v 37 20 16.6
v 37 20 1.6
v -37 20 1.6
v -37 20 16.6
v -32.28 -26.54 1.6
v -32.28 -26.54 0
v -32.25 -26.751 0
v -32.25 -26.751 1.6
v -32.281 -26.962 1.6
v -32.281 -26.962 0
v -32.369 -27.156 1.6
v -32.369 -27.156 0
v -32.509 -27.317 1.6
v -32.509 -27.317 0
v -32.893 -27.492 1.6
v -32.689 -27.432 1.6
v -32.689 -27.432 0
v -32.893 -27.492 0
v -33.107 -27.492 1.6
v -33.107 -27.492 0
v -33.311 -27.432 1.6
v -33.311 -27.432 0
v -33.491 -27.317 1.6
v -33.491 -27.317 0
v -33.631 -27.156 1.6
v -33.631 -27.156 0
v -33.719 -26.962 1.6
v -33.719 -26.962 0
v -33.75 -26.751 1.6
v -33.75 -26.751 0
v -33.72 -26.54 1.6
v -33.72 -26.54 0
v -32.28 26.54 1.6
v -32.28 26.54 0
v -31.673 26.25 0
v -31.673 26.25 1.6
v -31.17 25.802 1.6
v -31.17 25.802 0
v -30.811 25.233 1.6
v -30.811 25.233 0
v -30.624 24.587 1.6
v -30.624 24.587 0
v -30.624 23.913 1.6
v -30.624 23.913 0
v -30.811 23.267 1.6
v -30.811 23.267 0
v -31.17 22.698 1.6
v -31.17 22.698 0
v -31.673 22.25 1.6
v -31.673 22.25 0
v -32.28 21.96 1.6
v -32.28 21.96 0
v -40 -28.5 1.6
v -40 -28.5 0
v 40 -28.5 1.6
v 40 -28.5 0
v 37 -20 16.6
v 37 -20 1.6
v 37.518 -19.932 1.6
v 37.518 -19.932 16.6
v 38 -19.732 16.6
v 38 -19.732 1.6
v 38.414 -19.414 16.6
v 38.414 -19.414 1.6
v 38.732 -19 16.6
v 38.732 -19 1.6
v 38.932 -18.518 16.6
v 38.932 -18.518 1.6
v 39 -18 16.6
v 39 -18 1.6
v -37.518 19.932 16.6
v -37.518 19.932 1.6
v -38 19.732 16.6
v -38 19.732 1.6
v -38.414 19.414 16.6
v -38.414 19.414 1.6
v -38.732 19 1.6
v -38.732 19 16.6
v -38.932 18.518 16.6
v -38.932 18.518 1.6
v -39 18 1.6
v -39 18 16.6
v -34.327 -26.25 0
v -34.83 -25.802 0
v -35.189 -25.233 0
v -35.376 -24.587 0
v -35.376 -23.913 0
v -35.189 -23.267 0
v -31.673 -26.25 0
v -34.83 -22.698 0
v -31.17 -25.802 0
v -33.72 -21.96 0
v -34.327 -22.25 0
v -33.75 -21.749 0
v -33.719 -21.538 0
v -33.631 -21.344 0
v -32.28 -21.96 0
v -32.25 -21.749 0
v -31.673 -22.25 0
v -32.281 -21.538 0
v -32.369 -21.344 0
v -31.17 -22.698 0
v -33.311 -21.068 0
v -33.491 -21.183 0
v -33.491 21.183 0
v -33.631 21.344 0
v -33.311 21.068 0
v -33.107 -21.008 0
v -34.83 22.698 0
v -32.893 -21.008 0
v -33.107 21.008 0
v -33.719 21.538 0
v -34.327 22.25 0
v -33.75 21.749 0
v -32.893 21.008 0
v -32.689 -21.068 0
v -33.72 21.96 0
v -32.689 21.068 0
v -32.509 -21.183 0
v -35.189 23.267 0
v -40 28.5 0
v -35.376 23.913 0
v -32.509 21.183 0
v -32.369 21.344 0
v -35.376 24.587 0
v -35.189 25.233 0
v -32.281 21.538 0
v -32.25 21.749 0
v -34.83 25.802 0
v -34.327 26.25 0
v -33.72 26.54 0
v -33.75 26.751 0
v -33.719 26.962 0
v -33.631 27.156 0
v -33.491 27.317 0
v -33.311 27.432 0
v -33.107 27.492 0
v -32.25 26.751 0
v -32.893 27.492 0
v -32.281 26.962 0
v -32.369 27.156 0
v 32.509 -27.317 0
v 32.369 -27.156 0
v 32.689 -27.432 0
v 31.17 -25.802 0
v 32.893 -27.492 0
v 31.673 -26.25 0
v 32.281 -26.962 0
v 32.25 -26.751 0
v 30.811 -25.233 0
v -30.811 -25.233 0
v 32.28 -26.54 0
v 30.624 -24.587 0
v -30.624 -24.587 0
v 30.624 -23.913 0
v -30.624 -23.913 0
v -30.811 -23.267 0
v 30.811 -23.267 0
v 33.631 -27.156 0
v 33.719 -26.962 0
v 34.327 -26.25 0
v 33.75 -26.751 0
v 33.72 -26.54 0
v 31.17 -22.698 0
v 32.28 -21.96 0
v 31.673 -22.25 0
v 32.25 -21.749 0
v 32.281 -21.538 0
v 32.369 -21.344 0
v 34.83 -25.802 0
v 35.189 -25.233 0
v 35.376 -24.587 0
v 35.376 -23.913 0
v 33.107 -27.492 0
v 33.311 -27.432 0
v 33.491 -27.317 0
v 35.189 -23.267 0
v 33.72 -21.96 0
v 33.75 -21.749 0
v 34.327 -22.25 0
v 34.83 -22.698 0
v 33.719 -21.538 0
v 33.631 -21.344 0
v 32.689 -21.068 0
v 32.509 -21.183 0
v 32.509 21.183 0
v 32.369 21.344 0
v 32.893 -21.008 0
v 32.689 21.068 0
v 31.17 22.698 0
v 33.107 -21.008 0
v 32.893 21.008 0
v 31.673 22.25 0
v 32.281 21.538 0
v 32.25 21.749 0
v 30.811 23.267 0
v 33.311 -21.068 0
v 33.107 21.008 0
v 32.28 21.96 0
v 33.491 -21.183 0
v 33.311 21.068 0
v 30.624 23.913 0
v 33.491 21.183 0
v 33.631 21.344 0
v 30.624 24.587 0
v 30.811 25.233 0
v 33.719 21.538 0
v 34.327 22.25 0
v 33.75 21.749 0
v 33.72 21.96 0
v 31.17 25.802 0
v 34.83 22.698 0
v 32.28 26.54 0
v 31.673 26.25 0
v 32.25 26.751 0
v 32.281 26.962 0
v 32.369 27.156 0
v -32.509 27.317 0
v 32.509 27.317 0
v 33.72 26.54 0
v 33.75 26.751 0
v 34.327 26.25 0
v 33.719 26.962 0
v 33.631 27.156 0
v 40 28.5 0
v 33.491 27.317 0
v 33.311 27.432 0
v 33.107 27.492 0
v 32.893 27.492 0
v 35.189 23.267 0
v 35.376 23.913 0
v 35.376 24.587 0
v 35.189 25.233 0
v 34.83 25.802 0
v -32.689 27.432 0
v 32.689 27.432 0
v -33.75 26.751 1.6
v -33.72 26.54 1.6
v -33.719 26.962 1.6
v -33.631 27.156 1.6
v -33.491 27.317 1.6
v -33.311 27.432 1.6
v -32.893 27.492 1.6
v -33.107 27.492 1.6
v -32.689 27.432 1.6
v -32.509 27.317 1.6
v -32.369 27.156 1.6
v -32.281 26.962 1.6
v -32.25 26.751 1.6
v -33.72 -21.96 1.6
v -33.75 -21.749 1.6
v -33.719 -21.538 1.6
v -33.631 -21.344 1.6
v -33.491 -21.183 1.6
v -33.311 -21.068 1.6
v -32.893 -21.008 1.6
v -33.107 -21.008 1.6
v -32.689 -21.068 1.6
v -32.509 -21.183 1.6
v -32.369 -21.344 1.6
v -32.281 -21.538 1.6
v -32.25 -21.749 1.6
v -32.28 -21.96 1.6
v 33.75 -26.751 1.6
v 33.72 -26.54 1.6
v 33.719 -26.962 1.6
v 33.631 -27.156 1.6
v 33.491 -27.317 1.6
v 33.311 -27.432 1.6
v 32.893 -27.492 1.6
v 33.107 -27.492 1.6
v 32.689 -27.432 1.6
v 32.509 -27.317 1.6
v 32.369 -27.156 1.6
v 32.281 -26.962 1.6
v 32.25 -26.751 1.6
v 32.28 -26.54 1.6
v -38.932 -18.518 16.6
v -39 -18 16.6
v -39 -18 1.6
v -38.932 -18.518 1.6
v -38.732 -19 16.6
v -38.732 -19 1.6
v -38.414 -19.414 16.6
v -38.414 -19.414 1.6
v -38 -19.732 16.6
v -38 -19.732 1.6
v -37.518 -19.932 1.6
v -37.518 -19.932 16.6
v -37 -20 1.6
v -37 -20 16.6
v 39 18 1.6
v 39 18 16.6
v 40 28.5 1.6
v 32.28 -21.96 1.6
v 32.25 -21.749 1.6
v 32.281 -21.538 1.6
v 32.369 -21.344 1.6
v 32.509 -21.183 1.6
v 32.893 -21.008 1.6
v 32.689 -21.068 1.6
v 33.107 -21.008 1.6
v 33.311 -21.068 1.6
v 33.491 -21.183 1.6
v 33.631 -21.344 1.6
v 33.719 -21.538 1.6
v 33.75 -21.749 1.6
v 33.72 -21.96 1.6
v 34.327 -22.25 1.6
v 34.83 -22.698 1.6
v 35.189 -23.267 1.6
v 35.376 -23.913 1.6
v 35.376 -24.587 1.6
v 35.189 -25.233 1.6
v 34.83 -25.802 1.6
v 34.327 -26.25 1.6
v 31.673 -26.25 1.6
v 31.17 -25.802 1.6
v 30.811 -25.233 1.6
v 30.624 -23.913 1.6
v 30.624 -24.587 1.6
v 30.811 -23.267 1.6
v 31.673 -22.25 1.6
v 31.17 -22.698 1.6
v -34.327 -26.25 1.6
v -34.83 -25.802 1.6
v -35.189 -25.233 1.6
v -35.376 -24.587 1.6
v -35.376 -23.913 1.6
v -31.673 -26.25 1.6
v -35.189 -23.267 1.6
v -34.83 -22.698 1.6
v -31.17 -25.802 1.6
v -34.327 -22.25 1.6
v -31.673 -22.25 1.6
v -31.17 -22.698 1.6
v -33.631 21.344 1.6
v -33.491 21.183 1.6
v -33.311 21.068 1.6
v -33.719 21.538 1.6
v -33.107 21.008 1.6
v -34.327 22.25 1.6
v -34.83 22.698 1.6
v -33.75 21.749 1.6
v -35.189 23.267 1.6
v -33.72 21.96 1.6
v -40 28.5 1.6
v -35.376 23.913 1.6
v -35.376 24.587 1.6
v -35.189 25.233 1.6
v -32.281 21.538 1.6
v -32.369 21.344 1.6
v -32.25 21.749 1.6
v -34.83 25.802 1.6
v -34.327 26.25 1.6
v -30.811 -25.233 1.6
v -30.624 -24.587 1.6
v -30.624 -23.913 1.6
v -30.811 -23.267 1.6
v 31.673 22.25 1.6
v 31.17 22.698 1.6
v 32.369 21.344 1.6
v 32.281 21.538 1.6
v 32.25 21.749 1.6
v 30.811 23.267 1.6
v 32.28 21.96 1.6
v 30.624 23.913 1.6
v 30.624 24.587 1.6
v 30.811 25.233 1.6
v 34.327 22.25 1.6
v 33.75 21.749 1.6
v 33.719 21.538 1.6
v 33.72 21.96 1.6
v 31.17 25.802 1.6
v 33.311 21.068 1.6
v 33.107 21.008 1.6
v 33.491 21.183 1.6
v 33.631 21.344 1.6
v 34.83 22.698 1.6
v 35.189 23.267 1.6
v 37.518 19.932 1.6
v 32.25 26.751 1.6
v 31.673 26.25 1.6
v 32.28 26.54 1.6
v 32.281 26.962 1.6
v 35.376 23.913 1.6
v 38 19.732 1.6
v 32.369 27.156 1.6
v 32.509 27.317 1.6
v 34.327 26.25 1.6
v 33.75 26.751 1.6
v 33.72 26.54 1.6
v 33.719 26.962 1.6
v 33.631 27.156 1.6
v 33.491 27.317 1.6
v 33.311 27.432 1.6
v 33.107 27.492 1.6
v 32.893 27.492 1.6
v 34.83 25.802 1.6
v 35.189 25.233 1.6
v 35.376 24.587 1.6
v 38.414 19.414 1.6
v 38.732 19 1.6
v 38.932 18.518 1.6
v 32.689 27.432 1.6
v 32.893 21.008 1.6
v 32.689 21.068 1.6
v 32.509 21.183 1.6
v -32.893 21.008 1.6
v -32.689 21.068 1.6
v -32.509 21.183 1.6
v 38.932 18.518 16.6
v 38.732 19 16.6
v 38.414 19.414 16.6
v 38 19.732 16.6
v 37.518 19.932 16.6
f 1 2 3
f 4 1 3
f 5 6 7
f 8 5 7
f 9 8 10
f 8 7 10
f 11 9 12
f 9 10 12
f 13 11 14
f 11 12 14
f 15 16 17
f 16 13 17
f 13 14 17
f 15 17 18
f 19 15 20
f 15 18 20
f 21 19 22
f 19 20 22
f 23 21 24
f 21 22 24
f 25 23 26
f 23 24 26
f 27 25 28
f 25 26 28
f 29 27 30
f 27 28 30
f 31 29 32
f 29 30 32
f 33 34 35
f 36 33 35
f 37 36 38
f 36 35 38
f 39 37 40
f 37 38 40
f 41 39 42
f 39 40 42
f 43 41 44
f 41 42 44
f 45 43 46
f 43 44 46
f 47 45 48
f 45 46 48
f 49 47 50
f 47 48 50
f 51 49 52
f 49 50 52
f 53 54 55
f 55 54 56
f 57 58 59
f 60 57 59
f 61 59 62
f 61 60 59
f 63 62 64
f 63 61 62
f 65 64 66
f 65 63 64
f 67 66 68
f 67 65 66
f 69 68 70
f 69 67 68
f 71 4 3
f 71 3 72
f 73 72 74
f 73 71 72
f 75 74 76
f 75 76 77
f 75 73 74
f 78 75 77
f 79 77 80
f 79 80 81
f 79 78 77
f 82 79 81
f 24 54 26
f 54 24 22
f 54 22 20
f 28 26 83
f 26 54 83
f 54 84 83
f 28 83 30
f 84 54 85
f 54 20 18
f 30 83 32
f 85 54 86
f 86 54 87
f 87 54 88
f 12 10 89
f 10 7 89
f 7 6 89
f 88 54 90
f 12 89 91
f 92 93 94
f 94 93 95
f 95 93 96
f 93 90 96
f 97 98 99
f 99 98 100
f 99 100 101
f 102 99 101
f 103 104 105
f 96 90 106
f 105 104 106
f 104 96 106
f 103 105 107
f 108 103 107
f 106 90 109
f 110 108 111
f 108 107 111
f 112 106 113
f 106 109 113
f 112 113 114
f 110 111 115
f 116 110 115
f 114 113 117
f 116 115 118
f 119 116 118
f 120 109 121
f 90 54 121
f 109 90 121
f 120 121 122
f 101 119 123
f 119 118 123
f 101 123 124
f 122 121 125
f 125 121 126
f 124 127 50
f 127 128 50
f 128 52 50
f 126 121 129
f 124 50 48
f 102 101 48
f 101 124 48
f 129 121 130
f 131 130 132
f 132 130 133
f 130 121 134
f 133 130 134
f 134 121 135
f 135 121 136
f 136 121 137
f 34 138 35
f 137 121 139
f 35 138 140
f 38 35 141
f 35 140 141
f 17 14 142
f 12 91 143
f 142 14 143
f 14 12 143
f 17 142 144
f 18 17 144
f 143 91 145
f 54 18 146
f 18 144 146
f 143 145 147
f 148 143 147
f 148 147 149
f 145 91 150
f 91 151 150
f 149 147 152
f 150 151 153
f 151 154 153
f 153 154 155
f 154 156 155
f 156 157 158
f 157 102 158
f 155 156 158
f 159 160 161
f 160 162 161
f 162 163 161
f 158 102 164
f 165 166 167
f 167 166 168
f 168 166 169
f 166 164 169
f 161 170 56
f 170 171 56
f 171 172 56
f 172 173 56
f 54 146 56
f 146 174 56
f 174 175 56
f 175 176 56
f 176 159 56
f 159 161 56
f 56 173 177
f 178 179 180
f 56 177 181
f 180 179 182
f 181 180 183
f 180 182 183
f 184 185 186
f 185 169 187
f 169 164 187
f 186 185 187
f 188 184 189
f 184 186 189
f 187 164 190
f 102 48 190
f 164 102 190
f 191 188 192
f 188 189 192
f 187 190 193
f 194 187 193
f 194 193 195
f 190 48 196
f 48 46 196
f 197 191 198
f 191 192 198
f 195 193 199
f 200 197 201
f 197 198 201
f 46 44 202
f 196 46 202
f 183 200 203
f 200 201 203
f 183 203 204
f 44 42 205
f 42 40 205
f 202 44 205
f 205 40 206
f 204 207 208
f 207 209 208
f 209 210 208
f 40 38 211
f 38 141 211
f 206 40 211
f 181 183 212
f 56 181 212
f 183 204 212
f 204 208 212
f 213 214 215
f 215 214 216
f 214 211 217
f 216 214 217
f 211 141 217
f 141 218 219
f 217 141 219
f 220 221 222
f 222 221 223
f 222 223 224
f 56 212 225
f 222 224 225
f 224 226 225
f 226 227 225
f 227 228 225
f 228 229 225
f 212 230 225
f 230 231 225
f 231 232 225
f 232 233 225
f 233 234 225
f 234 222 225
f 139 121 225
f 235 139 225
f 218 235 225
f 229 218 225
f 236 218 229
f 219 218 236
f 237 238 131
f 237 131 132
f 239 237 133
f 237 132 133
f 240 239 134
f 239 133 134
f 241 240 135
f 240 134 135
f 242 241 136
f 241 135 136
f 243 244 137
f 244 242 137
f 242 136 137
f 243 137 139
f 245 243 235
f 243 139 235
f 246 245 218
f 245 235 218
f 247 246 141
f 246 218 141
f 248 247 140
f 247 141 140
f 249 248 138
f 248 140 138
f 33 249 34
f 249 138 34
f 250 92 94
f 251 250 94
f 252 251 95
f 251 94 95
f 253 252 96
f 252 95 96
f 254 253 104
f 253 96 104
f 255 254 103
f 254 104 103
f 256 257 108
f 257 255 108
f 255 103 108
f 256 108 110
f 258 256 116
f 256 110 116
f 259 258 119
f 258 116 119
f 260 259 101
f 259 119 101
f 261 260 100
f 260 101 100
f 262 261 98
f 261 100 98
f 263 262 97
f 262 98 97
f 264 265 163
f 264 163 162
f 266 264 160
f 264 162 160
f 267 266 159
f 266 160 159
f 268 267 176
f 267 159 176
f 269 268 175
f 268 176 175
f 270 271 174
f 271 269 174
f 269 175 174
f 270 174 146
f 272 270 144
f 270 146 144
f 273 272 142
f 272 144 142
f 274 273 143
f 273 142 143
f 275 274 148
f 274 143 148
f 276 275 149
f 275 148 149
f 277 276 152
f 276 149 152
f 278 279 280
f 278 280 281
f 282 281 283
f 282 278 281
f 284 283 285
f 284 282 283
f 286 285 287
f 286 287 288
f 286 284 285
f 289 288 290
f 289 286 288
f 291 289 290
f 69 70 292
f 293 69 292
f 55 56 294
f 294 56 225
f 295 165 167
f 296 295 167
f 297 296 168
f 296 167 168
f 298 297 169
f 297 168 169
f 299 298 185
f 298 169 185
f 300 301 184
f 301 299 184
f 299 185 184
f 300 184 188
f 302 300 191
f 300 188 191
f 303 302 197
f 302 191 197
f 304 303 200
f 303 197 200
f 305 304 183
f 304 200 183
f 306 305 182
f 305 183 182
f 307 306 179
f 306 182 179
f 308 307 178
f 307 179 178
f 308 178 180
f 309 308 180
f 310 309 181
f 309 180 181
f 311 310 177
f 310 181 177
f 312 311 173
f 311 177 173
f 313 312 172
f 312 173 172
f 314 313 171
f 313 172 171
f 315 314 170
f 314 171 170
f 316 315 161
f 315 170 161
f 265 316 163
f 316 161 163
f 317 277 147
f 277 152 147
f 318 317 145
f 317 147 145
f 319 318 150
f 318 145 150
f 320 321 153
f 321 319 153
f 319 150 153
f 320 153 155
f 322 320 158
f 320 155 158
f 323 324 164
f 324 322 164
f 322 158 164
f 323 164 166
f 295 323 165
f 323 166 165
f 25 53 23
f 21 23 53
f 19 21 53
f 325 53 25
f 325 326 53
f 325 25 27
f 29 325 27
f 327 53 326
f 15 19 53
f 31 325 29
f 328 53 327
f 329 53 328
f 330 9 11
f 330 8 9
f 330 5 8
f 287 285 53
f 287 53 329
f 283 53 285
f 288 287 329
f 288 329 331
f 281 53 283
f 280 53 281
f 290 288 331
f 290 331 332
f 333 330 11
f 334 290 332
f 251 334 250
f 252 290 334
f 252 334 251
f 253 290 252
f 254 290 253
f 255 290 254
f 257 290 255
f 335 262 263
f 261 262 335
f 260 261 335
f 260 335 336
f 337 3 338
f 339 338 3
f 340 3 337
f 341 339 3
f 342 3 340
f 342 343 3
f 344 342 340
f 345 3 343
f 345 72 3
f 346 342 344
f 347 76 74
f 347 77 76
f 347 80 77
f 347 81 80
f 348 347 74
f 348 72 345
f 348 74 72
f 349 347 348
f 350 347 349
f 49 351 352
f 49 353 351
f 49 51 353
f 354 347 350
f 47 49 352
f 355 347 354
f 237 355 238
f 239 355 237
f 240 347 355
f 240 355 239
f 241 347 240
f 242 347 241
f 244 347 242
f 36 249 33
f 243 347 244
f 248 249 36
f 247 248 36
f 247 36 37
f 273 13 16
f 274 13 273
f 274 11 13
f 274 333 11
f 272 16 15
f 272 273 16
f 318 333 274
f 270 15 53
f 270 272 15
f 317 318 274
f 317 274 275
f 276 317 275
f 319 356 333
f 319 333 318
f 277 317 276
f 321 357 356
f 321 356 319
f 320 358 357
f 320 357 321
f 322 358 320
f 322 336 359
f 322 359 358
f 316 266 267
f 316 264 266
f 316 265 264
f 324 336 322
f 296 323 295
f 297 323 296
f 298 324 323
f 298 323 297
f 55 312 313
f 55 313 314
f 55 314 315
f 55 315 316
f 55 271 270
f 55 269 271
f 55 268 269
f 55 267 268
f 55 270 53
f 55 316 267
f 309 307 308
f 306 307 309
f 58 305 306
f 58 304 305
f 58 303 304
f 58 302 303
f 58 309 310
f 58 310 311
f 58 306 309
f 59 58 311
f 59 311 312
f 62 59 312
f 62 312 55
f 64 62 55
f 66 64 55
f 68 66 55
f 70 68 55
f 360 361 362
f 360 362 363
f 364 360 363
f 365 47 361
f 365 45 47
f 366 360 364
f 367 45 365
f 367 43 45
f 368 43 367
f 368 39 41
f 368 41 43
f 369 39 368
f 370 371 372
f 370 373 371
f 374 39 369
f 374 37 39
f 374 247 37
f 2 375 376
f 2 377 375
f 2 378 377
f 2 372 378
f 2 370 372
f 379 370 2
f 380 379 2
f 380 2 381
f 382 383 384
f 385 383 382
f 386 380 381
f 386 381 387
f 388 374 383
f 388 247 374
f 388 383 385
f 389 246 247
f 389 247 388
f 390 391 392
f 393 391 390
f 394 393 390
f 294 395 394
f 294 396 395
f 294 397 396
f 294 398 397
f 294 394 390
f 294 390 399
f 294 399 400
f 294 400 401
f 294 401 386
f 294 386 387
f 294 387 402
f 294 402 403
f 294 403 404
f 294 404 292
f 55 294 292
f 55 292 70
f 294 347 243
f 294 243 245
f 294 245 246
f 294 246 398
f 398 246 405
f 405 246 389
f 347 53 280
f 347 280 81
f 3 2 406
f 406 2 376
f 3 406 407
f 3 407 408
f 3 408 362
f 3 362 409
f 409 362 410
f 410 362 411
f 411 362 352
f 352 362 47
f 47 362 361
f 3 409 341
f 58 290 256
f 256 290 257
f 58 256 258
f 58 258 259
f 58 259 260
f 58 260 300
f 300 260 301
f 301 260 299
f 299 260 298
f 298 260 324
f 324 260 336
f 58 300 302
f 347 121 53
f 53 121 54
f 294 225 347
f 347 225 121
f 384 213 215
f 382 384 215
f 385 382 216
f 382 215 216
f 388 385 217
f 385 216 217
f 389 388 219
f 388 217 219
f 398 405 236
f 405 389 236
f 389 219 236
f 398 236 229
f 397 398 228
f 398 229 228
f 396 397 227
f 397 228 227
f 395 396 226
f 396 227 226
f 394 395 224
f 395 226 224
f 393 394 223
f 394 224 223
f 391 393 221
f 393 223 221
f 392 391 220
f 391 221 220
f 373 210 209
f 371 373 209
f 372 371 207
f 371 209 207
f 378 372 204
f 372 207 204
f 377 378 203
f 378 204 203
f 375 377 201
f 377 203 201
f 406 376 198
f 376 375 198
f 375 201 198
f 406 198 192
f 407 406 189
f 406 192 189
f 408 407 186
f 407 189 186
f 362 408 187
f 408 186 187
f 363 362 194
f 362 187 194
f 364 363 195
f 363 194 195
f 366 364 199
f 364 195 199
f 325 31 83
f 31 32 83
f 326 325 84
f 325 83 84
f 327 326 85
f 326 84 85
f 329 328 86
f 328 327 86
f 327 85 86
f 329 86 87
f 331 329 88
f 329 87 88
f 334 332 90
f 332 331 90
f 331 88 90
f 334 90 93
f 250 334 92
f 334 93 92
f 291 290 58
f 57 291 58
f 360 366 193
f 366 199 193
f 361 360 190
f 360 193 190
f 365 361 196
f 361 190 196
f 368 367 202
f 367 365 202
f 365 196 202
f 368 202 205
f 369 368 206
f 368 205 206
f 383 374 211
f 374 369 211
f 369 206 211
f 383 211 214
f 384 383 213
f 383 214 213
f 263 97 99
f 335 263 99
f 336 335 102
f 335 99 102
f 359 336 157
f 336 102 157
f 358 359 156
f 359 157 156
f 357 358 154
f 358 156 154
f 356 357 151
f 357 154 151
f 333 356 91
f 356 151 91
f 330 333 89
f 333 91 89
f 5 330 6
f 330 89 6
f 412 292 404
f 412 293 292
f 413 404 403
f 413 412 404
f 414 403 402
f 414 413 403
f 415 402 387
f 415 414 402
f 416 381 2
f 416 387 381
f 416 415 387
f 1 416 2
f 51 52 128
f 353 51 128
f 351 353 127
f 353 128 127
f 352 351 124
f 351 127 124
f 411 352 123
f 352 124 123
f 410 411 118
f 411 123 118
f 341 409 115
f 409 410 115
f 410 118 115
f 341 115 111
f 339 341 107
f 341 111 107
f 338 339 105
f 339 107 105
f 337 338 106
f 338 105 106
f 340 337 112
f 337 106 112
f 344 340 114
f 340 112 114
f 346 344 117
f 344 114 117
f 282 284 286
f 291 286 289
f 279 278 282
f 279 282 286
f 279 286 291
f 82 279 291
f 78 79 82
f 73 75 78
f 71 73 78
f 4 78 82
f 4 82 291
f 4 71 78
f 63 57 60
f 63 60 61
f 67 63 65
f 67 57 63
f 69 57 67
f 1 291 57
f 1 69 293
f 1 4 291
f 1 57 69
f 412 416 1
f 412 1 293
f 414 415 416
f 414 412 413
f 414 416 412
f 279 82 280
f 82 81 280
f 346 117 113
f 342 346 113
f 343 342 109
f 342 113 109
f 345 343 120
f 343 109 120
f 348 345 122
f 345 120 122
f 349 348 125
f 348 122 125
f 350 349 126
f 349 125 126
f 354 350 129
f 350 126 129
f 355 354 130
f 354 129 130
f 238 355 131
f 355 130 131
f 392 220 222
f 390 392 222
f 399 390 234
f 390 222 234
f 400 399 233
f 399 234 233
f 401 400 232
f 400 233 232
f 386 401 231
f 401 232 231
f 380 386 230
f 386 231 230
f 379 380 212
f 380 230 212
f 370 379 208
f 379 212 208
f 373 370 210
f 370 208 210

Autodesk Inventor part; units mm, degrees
ref_plane "YZ Plane" through (0, 0, 0) normal (1, 0, 0) x (0, 1, 0)
ref_plane "XZ Plane" through (0, 0, 0) normal (0, 1, 0) x (-1, 0, 0)
ref_plane "XY Plane" through (0, 0, 0) normal (0, 0, 1) x (1, 0, 0)
sketch "Sketch1" plane through (0, 0, 0) normal (0, 0, 1) x (1, 0, 0)
  line L0 (40, 28.5) -> (-40, 28.5)
  line L1 (-40, 28.5) -> (-40, -28.5)
  line L2 (-40, -28.5) -> (40, -28.5)
  line L3 (40, -28.5) -> (40, 28.5)
  line L4 (40, 28.5) -> (-40, -28.5) construction
  line L5 (-40, 28.5) -> (40, -28.5) construction
  line L6 (-33, 24.25) -> (33, 24.25) construction
  line L7 (33, 24.25) -> (33, -24.25) construction
  line L8 (33, -24.25) -> (-33, -24.25) construction
  line L9 (-33, -24.25) -> (-33, 24.25) construction
  line L10 (-33, 24.25) -> (33, -24.25) construction
  line L11 (33, 24.25) -> (-33, -24.25) construction
  line L12 (40, 0) -> (-40, 0) construction
  line L13 (0, 28.5) -> (0, -28.5) construction
  circle A0 centre (33, 24.25) radius 2.4
  circle A1 centre (-33, 24.25) radius 2.4
  circle A2 centre (33, -24.25) radius 2.4
  circle A3 centre (-33, -24.25) radius 2.4
  line L14 (33, 27.5) -> (33, 21) construction
  arc A4 (32.2801, 21.9605) -> (33.7199, 21.9605) centre (33, 21.75) ccw
  arc A5 (-33.7199, 21.9605) -> (-32.2801, 21.9605) centre (-33, 21.75) ccw
  arc A6 (33.7199, -21.9605) -> (32.2801, -21.9605) centre (33, -21.75) ccw
  arc A7 (-32.2801, -21.9605) -> (-33.7199, -21.9605) centre (-33, -21.75) ccw
  line L15 (39, 20) -> (-39, 20)
  line L16 (-39, 20) -> (-39, -20)
  line L17 (-39, -20) -> (39, -20)
  line L18 (39, -20) -> (39, 20)
  line L19 (39, 20) -> (-39, -20) construction
  line L20 (-39, 20) -> (39, -20) construction
  arc A8 (33.7199, 26.5395) -> (32.2801, 26.5395) centre (33, 26.75) ccw
  arc A9 (-32.2801, 26.5395) -> (-33.7199, 26.5395) centre (-33, 26.75) ccw
  arc A10 (32.2801, -26.5395) -> (33.7199, -26.5395) centre (33, -26.75) ccw
  arc A11 (-33.7199, -26.5395) -> (-32.2801, -26.5395) centre (-33, -26.75) ccw
  point P0 (0, 0)
  point P1 (33, -21)
  point P2 (-32.2801, 21.9605)
  point P3 (-33.7199, 21.9605)
  point P4 (-33.7199, -21.9605)
  point P5 (-32.2801, -21.9605)
  point P6 (32.2801, -21.9605)
  point P7 (33.7199, -21.9605)
  point P8 (32.2801, 26.5395)
  point P9 (33.7199, 26.5395)
  point P10 (-33.7199, 26.5395)
  point P11 (-32.2801, 26.5395)
  point P12 (-32.2801, -26.5395)
  point P13 (-33.7199, -26.5395)
  point P14 (33.7199, -26.5395)
  point P15 (32.2801, -26.5395)
  dimension "d0" = 80
  dimension "d1" = 57
  dimension "d19" = 4.8
  dimension "d30" = 6.5
  dimension "d33" = 48.5
  dimension "d34" = 66
  dimension "d36" = 1.5
  dimension "d37" = 8.5
  dimension "d38" = 1
  dimension "d41" = 14
  dimension "d42" = 6.5
  dimension "d43" = 1
extrude "Extrusion1" add sketch "Sketch1" along normal blind 1.6 contours L3 L2 L1 L0 | L18 L17 L16 L15
extrude "Extrusion2" add sketch "Sketch1" along normal blind 16.6 contours L18 L17 L16 L15
fillet "Fillet1" radius 2 4 edges at (39, -20, 9.1) (39, 20, 9.1) (-39, -20, 9.1) (-39, 20, 9.1)
properties part number "SUSTAINA-POWER-DISTRIBUTION-BOARD" material "Acetal Resin, Black"
